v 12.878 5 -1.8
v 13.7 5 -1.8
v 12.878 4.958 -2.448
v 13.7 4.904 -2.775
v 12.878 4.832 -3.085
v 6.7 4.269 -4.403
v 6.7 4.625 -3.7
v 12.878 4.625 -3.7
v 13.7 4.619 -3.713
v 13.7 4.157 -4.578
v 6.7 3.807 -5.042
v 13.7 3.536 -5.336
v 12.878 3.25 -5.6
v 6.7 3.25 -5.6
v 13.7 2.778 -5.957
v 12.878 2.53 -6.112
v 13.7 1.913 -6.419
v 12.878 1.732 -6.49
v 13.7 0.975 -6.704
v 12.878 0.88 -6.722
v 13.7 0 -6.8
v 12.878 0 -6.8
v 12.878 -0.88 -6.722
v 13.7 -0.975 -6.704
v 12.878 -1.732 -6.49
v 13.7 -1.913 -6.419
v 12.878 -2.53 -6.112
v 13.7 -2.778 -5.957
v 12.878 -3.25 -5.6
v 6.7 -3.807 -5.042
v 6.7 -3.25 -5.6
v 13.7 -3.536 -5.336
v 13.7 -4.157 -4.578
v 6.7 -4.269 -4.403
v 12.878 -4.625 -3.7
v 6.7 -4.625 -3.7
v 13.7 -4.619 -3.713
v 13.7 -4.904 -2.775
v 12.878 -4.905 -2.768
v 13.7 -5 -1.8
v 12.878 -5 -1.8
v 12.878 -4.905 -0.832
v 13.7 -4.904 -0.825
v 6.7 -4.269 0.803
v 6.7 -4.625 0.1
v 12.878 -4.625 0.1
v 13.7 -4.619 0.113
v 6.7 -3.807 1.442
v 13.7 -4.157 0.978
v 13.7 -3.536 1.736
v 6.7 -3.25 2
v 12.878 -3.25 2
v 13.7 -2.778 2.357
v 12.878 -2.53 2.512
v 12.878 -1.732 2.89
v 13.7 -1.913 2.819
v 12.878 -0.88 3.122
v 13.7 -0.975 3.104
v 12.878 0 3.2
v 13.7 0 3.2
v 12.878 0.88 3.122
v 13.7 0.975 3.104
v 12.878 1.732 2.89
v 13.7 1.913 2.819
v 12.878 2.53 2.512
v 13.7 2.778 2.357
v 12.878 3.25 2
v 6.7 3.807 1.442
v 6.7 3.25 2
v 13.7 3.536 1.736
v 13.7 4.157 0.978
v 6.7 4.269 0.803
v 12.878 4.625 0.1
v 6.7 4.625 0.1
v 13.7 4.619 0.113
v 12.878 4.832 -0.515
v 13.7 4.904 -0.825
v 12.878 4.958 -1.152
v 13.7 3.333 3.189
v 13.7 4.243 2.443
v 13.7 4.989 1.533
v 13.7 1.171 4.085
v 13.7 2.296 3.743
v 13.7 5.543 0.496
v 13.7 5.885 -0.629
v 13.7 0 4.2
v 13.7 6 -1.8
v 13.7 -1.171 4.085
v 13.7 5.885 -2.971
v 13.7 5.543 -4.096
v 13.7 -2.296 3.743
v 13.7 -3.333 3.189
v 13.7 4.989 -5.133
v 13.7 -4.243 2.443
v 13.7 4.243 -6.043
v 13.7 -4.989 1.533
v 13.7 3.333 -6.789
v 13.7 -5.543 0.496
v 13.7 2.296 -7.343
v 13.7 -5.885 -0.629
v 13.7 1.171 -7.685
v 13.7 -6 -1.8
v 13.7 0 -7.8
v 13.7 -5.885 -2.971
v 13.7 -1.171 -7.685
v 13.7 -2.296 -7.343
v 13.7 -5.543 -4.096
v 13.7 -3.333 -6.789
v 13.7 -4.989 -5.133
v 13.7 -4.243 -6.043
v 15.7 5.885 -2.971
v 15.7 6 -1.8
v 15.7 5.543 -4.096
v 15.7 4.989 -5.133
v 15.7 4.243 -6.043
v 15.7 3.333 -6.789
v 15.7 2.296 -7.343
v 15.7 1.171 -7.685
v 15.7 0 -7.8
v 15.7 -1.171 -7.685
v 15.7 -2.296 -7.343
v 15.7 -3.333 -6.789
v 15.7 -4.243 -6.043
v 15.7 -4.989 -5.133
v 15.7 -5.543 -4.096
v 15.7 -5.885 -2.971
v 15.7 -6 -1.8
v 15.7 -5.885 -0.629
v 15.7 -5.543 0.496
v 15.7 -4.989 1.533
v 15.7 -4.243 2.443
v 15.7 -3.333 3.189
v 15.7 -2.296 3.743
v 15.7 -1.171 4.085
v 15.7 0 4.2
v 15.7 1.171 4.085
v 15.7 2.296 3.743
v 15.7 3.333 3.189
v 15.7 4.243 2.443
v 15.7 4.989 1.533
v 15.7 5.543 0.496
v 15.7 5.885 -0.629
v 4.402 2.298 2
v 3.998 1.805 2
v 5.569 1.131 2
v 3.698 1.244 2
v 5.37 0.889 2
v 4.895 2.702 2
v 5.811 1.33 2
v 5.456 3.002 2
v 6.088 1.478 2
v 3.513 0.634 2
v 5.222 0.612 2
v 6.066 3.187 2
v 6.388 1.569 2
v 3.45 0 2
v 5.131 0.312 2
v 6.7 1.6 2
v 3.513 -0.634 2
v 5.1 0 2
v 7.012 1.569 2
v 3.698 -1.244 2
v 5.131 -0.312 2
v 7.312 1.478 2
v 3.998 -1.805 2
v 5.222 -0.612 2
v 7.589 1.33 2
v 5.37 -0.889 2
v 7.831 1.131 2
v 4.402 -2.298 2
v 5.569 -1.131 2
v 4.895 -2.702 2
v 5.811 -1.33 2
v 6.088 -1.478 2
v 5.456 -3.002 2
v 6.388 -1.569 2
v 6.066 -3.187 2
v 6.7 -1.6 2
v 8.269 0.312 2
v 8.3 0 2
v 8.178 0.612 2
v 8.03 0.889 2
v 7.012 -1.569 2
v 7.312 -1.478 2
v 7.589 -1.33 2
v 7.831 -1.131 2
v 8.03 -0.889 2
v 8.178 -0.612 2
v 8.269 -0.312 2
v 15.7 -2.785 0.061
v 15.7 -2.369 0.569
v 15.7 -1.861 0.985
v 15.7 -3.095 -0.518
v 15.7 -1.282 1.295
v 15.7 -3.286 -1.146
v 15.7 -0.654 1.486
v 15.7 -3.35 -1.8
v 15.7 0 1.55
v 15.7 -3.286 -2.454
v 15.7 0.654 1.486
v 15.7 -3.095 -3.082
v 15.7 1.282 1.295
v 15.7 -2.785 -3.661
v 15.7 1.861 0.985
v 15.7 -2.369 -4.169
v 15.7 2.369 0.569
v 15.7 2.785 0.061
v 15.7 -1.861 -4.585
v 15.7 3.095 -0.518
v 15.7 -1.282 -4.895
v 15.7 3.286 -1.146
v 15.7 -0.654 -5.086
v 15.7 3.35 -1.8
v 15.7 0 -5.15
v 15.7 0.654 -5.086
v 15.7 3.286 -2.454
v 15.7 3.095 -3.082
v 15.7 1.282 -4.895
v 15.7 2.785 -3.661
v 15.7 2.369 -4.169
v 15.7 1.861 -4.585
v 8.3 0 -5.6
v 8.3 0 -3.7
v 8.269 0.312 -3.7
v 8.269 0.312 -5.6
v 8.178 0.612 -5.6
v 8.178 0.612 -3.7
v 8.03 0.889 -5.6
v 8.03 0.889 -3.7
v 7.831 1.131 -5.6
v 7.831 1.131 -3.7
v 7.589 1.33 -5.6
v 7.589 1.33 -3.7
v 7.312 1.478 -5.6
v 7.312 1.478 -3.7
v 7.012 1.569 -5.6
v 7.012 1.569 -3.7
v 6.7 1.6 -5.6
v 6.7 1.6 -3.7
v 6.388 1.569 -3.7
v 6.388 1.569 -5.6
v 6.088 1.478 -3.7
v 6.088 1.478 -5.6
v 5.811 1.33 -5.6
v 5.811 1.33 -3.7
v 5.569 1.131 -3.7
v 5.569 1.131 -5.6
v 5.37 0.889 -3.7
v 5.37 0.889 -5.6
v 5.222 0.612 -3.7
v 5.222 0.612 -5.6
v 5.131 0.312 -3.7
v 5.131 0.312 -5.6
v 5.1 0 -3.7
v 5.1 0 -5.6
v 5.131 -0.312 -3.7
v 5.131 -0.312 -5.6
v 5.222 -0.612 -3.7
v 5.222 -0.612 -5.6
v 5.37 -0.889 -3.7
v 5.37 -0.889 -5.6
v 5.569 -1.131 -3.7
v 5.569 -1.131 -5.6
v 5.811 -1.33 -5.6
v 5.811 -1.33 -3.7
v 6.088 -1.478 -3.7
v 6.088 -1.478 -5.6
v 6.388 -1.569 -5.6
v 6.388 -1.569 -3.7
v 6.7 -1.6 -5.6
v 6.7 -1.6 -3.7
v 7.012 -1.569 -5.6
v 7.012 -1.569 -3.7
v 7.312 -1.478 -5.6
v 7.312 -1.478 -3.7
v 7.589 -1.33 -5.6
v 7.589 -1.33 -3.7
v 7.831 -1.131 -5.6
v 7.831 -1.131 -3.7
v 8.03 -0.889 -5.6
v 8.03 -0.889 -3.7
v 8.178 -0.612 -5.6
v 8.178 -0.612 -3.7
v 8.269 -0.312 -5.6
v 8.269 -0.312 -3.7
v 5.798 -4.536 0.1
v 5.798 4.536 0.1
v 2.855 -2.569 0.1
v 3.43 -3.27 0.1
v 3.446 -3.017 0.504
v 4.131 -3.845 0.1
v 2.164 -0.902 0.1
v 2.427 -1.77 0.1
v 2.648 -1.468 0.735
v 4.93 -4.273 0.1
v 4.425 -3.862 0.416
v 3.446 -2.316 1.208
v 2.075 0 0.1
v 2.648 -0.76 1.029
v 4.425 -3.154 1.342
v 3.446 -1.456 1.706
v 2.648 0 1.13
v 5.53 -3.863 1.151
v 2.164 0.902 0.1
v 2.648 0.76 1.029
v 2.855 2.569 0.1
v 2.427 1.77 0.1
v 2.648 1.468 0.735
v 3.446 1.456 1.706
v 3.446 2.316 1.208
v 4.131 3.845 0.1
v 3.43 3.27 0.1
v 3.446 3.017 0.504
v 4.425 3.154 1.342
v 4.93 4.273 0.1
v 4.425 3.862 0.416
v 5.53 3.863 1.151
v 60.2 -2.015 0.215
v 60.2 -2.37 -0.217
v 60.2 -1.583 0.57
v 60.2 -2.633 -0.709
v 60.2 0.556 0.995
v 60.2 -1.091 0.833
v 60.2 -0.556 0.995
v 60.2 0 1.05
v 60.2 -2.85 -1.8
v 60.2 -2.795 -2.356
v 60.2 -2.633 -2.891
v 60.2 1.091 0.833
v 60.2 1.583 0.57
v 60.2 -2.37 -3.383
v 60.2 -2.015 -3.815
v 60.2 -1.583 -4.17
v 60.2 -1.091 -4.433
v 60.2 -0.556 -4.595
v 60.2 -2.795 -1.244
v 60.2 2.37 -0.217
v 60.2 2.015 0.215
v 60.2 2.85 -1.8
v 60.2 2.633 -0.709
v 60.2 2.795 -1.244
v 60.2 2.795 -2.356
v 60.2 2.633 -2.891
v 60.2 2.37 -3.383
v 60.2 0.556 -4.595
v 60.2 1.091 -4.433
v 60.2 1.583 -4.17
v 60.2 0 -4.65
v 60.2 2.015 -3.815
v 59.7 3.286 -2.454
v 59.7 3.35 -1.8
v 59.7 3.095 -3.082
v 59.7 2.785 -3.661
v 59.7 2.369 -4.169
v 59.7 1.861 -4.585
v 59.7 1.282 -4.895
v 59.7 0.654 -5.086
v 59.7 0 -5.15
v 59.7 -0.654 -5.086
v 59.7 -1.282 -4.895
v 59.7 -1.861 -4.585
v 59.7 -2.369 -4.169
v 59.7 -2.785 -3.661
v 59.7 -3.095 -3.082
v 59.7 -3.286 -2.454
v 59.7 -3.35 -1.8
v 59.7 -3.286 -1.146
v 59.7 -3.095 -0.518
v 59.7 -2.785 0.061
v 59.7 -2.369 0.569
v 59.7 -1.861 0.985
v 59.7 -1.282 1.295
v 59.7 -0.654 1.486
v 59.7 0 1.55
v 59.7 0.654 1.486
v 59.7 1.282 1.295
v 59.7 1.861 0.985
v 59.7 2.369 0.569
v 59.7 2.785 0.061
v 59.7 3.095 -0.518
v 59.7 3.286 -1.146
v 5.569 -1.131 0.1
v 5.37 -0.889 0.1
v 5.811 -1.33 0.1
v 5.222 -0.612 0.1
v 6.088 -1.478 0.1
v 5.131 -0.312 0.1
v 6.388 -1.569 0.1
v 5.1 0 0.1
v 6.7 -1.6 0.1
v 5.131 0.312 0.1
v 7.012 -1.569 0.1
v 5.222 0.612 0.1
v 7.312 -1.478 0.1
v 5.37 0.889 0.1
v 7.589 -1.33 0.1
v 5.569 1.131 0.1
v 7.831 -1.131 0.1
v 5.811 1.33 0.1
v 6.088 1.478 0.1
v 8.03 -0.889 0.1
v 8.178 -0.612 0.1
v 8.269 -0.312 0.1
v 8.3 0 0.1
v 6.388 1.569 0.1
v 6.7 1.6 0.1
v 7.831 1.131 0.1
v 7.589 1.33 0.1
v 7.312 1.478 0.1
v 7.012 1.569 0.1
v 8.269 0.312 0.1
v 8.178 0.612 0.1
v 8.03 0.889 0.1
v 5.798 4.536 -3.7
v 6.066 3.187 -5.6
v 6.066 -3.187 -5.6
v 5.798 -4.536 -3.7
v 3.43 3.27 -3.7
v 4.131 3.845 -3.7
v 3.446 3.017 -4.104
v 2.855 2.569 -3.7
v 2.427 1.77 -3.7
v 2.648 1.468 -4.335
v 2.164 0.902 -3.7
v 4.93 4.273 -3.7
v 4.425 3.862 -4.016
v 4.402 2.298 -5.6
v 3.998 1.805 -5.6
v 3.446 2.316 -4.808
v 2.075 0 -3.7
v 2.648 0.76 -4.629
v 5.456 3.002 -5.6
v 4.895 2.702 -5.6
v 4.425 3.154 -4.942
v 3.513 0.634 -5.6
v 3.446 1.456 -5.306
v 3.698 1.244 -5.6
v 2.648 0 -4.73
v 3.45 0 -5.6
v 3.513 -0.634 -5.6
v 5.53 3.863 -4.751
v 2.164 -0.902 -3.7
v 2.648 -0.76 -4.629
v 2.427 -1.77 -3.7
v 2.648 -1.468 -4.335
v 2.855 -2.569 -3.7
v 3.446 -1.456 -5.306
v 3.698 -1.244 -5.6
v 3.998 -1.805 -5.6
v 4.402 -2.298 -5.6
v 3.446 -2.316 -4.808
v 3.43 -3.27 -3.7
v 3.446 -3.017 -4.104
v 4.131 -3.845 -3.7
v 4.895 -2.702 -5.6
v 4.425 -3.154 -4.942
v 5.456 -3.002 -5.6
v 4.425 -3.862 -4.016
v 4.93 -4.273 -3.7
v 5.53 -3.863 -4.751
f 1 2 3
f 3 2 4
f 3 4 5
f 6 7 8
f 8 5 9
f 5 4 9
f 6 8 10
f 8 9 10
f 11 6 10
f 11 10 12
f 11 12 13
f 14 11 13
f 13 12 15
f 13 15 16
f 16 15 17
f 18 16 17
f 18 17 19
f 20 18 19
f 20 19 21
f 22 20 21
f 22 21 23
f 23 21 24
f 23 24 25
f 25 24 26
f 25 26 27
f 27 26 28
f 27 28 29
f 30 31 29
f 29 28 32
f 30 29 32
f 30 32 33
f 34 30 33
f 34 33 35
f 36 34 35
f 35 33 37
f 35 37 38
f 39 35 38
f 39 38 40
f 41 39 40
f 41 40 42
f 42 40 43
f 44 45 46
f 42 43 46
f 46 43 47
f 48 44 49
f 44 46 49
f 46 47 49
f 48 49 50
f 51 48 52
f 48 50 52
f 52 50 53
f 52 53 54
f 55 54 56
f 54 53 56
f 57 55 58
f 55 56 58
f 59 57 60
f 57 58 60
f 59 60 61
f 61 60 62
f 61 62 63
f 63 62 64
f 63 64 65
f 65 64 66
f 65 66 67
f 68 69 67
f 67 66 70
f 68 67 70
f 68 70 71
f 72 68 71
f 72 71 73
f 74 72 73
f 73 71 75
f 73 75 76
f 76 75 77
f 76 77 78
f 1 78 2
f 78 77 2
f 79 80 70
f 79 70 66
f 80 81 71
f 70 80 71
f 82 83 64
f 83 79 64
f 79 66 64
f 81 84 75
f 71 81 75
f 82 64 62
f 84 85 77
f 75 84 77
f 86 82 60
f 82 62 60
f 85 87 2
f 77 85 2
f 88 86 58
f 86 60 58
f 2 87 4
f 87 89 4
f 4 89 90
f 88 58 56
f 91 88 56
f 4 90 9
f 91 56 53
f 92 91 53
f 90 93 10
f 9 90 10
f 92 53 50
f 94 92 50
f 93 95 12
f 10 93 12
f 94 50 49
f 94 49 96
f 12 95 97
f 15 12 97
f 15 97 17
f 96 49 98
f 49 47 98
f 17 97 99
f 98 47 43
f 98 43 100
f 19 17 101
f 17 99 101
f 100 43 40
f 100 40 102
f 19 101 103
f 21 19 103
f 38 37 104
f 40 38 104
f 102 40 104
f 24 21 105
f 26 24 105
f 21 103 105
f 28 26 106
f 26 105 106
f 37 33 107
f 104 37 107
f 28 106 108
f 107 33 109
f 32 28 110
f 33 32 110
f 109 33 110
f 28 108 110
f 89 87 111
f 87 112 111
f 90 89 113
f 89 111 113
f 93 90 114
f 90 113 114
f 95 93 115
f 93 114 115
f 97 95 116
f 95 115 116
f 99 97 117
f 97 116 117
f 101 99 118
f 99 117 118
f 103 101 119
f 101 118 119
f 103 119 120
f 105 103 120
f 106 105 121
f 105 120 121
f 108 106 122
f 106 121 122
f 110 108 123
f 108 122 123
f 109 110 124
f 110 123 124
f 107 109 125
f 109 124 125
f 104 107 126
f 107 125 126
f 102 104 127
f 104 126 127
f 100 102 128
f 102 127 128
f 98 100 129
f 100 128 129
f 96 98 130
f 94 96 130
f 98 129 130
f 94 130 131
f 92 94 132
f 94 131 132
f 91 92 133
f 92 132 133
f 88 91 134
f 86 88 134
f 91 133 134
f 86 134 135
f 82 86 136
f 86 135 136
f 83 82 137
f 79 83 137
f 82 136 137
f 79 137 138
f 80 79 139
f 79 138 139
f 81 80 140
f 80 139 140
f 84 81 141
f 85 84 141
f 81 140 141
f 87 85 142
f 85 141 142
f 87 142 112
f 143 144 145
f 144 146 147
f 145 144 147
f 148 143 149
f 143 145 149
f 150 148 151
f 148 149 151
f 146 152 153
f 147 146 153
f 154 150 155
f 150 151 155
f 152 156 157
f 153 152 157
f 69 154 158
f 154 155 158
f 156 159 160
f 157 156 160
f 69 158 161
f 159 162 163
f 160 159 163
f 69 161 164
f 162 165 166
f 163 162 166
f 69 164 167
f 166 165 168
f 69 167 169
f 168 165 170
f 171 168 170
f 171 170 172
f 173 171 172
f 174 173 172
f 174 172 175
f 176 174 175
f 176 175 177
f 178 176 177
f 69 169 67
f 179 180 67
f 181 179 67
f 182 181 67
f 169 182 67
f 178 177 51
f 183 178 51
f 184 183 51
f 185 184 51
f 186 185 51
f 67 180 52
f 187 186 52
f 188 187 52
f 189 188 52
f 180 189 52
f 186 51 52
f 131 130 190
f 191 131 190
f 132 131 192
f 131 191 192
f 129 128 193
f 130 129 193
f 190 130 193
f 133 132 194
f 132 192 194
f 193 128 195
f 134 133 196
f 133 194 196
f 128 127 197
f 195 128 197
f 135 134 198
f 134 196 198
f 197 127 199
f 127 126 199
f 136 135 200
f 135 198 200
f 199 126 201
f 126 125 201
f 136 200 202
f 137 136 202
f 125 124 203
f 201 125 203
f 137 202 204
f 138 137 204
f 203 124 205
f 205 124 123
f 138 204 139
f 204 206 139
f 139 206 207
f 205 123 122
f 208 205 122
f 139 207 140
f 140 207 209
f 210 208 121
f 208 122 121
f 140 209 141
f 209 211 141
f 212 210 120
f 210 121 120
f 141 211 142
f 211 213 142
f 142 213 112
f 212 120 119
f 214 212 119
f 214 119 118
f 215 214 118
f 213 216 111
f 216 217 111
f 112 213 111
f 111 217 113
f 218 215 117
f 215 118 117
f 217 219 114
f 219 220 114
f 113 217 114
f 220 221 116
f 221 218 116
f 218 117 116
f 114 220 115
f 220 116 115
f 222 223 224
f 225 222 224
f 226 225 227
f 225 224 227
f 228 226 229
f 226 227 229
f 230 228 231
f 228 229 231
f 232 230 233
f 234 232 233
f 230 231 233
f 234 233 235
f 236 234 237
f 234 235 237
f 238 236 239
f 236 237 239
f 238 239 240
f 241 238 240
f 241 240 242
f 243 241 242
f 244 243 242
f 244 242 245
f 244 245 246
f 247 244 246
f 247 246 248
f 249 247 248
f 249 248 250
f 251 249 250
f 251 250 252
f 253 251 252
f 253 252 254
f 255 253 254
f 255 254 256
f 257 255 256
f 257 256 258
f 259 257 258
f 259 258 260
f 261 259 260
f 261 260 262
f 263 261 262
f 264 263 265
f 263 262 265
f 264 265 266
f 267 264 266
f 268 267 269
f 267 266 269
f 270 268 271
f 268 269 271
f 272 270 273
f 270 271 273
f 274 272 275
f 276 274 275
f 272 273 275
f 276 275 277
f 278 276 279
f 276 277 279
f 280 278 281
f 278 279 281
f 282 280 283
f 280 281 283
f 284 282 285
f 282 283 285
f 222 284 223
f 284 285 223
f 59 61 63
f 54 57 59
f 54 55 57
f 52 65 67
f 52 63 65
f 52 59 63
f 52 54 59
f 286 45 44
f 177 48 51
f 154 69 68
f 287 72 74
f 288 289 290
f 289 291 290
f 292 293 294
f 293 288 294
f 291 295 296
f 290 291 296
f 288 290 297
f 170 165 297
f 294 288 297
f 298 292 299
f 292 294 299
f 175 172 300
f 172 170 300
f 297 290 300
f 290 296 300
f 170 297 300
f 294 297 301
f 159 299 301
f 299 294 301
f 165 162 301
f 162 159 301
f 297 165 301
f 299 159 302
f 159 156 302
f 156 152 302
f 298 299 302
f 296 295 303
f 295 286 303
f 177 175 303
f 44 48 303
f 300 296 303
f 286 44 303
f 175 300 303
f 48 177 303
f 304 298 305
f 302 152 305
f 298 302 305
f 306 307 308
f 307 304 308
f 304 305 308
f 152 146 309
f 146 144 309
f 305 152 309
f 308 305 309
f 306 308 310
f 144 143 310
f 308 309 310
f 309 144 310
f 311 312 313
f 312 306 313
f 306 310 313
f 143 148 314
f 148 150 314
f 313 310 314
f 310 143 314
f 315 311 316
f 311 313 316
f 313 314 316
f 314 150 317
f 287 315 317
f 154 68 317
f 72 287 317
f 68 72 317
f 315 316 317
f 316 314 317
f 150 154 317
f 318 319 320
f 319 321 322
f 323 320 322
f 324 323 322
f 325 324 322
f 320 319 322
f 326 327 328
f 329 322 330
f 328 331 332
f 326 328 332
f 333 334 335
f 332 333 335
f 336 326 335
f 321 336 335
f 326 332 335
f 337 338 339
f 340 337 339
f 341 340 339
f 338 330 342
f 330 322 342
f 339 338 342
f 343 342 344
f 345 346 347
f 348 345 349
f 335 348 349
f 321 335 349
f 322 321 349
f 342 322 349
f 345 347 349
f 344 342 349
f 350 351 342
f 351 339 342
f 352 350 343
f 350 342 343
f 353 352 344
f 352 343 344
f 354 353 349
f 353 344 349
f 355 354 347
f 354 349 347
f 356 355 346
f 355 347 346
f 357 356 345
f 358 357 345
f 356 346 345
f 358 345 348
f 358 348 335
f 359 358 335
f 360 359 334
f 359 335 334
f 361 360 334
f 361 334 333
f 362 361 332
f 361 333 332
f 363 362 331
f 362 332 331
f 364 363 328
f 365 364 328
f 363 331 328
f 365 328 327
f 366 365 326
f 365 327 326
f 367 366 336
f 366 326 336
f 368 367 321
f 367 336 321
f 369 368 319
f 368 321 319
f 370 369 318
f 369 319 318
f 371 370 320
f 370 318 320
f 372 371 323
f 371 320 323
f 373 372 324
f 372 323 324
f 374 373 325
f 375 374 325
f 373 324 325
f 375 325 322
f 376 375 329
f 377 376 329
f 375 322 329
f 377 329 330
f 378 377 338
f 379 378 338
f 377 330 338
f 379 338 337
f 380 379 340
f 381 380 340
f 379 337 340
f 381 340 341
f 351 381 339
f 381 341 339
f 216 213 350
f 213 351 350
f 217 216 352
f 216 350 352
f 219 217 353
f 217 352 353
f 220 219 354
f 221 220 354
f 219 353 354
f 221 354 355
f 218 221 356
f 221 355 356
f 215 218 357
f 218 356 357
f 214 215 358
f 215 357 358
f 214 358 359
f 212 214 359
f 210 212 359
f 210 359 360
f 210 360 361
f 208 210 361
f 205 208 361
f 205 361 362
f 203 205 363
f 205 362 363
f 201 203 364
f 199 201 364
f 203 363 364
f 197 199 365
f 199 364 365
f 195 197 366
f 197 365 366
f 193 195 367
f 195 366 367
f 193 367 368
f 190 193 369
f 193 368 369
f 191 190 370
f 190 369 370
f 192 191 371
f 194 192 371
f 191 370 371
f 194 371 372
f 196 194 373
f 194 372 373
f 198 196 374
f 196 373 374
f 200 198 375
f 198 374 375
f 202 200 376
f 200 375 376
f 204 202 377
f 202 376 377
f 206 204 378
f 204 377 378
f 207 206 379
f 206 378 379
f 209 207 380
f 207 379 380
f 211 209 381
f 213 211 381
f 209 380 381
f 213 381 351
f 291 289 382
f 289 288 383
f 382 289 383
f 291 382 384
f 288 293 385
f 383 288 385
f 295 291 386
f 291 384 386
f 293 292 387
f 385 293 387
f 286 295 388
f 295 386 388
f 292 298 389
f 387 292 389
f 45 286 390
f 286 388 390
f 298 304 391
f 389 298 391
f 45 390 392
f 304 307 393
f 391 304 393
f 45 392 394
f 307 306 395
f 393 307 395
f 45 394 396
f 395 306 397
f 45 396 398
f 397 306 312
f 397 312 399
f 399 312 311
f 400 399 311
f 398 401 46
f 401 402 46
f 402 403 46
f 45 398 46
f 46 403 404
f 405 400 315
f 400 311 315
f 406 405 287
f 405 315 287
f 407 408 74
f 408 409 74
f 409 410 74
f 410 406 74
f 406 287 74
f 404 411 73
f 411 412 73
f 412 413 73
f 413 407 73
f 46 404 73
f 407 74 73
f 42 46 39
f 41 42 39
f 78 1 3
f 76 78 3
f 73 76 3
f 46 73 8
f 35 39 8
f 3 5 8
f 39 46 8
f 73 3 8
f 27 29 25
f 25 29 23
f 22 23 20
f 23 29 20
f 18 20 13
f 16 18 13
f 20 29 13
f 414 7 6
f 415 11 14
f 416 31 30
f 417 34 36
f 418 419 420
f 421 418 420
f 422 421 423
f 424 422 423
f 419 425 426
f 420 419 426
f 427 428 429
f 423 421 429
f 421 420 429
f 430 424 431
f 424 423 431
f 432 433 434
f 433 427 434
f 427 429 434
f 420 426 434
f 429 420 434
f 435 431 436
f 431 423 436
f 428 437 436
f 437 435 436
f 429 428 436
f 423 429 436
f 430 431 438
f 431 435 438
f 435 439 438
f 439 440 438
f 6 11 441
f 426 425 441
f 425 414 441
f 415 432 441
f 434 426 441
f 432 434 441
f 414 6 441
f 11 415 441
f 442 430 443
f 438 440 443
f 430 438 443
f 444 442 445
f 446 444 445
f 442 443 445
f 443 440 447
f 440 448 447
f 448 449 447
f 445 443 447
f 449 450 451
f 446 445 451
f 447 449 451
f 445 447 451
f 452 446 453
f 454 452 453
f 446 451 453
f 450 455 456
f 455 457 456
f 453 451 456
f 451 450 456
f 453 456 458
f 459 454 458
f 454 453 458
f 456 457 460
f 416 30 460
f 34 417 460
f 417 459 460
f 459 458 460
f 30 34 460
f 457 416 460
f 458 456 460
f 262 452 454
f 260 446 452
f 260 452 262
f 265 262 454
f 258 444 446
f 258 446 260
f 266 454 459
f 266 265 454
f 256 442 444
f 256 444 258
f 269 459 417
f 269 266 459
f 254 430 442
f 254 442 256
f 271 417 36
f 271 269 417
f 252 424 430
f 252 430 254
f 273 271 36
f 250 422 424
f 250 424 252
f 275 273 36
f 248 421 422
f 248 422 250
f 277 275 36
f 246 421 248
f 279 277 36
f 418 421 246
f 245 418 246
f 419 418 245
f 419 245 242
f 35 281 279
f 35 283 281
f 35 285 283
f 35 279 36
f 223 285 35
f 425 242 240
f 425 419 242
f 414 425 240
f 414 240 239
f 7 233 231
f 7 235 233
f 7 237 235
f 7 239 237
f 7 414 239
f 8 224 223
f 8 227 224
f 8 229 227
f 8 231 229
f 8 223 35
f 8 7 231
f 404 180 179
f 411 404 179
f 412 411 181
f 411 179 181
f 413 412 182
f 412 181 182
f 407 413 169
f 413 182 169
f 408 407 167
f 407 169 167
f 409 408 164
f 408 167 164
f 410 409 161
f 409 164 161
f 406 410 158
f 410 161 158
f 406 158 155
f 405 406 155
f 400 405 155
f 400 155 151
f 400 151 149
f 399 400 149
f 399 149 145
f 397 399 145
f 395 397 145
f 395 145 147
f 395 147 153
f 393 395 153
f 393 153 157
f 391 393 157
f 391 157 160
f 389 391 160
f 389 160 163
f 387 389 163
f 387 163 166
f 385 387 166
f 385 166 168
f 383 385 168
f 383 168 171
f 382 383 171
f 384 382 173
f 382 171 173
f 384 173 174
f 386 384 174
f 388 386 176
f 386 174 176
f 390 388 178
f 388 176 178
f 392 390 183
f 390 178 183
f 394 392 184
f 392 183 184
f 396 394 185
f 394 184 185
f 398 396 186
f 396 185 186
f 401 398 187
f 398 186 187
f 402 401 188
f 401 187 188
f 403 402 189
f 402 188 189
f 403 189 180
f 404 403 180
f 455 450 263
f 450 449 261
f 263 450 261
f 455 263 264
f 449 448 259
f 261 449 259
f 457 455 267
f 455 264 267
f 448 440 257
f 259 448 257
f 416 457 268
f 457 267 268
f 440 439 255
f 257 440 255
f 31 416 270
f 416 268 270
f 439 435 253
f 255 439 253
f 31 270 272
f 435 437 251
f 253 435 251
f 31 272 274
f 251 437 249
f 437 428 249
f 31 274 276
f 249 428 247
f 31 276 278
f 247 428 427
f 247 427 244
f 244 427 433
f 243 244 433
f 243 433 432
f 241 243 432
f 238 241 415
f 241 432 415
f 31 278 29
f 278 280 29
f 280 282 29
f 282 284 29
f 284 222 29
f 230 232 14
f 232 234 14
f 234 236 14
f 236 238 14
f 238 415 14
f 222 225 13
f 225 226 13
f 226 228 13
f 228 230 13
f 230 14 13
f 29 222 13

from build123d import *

# Parameters (mm, degrees)
SKETCH_3_W          = 10.261040874
SKETCH_3_H          = 1.404819466
CUT_EXTRUDE_1_DEPTH = 50
SKETCH_4_W          = 11.206560307
SKETCH_4_H          = 3.8
CUT_EXTRUDE_2_DEPTH = 50
SKETCH_7_R          = 1.6
CUT_EXTRUDE_4_DEPTH = 62.286866456


with BuildPart() as part:
    # 草图2 → 旋转1 (revolve)
    with BuildSketch(Plane.XY.offset(-1.8)):
        with BuildLine():
            Line((6.7, 5), (13.7, 5))
            Line((13.7, 5), (13.7, 6))
            Line((13.7, 6), (15.7, 6))
            Line((15.7, 6), (15.7, 3.35))
            Line((15.7, 3.35), (59.7, 3.35))
            Line((59.7, 3.35), (60.2, 2.85))
            Line((60.2, 2.85), (60.2, 0))
            Line((60.2, 0), (1.7, 0))
            ThreePointArc((1.7, 0), (3.164466094, 3.535533906), (6.7, 5))
        make_face()
    revolve(axis=Axis((60.2, 0, -1.8), (-1, 0, 0)))

    # 草图3 → 切除-拉伸1 (cut, symmetric)
    with BuildSketch(Plane(origin=(0, 0, -1.8), x_dir=(1, 0, 0), z_dir=(0, 1, 0))):
        with Locations((7.747323823, -4.502409733)):
            Rectangle(SKETCH_3_W, SKETCH_3_H)
        with Locations((7.747323823, 4.502409733)):
            Rectangle(SKETCH_3_W, SKETCH_3_H)
    extrude(amount=CUT_EXTRUDE_1_DEPTH, both=True, mode=Mode.SUBTRACT)

    # 草图4 → 切除-拉伸2 (cut, symmetric)
    with BuildSketch(Plane(origin=(0, 0, 0), x_dir=(1, 0, 0), z_dir=(0, 1, 0))):
        with Locations((7.274564107, 1.8)):
            Rectangle(SKETCH_4_W, SKETCH_4_H)
    extrude(amount=CUT_EXTRUDE_2_DEPTH, both=True, mode=Mode.SUBTRACT)

    # 草图7 → 切除-拉伸4 (cut, through all)
    with BuildSketch(Plane.XY.offset(2)):
        with Locations((6.7, 0)):
            Circle(SKETCH_7_R)
    extrude(amount=-CUT_EXTRUDE_4_DEPTH, mode=Mode.SUBTRACT)


solid = part.part
